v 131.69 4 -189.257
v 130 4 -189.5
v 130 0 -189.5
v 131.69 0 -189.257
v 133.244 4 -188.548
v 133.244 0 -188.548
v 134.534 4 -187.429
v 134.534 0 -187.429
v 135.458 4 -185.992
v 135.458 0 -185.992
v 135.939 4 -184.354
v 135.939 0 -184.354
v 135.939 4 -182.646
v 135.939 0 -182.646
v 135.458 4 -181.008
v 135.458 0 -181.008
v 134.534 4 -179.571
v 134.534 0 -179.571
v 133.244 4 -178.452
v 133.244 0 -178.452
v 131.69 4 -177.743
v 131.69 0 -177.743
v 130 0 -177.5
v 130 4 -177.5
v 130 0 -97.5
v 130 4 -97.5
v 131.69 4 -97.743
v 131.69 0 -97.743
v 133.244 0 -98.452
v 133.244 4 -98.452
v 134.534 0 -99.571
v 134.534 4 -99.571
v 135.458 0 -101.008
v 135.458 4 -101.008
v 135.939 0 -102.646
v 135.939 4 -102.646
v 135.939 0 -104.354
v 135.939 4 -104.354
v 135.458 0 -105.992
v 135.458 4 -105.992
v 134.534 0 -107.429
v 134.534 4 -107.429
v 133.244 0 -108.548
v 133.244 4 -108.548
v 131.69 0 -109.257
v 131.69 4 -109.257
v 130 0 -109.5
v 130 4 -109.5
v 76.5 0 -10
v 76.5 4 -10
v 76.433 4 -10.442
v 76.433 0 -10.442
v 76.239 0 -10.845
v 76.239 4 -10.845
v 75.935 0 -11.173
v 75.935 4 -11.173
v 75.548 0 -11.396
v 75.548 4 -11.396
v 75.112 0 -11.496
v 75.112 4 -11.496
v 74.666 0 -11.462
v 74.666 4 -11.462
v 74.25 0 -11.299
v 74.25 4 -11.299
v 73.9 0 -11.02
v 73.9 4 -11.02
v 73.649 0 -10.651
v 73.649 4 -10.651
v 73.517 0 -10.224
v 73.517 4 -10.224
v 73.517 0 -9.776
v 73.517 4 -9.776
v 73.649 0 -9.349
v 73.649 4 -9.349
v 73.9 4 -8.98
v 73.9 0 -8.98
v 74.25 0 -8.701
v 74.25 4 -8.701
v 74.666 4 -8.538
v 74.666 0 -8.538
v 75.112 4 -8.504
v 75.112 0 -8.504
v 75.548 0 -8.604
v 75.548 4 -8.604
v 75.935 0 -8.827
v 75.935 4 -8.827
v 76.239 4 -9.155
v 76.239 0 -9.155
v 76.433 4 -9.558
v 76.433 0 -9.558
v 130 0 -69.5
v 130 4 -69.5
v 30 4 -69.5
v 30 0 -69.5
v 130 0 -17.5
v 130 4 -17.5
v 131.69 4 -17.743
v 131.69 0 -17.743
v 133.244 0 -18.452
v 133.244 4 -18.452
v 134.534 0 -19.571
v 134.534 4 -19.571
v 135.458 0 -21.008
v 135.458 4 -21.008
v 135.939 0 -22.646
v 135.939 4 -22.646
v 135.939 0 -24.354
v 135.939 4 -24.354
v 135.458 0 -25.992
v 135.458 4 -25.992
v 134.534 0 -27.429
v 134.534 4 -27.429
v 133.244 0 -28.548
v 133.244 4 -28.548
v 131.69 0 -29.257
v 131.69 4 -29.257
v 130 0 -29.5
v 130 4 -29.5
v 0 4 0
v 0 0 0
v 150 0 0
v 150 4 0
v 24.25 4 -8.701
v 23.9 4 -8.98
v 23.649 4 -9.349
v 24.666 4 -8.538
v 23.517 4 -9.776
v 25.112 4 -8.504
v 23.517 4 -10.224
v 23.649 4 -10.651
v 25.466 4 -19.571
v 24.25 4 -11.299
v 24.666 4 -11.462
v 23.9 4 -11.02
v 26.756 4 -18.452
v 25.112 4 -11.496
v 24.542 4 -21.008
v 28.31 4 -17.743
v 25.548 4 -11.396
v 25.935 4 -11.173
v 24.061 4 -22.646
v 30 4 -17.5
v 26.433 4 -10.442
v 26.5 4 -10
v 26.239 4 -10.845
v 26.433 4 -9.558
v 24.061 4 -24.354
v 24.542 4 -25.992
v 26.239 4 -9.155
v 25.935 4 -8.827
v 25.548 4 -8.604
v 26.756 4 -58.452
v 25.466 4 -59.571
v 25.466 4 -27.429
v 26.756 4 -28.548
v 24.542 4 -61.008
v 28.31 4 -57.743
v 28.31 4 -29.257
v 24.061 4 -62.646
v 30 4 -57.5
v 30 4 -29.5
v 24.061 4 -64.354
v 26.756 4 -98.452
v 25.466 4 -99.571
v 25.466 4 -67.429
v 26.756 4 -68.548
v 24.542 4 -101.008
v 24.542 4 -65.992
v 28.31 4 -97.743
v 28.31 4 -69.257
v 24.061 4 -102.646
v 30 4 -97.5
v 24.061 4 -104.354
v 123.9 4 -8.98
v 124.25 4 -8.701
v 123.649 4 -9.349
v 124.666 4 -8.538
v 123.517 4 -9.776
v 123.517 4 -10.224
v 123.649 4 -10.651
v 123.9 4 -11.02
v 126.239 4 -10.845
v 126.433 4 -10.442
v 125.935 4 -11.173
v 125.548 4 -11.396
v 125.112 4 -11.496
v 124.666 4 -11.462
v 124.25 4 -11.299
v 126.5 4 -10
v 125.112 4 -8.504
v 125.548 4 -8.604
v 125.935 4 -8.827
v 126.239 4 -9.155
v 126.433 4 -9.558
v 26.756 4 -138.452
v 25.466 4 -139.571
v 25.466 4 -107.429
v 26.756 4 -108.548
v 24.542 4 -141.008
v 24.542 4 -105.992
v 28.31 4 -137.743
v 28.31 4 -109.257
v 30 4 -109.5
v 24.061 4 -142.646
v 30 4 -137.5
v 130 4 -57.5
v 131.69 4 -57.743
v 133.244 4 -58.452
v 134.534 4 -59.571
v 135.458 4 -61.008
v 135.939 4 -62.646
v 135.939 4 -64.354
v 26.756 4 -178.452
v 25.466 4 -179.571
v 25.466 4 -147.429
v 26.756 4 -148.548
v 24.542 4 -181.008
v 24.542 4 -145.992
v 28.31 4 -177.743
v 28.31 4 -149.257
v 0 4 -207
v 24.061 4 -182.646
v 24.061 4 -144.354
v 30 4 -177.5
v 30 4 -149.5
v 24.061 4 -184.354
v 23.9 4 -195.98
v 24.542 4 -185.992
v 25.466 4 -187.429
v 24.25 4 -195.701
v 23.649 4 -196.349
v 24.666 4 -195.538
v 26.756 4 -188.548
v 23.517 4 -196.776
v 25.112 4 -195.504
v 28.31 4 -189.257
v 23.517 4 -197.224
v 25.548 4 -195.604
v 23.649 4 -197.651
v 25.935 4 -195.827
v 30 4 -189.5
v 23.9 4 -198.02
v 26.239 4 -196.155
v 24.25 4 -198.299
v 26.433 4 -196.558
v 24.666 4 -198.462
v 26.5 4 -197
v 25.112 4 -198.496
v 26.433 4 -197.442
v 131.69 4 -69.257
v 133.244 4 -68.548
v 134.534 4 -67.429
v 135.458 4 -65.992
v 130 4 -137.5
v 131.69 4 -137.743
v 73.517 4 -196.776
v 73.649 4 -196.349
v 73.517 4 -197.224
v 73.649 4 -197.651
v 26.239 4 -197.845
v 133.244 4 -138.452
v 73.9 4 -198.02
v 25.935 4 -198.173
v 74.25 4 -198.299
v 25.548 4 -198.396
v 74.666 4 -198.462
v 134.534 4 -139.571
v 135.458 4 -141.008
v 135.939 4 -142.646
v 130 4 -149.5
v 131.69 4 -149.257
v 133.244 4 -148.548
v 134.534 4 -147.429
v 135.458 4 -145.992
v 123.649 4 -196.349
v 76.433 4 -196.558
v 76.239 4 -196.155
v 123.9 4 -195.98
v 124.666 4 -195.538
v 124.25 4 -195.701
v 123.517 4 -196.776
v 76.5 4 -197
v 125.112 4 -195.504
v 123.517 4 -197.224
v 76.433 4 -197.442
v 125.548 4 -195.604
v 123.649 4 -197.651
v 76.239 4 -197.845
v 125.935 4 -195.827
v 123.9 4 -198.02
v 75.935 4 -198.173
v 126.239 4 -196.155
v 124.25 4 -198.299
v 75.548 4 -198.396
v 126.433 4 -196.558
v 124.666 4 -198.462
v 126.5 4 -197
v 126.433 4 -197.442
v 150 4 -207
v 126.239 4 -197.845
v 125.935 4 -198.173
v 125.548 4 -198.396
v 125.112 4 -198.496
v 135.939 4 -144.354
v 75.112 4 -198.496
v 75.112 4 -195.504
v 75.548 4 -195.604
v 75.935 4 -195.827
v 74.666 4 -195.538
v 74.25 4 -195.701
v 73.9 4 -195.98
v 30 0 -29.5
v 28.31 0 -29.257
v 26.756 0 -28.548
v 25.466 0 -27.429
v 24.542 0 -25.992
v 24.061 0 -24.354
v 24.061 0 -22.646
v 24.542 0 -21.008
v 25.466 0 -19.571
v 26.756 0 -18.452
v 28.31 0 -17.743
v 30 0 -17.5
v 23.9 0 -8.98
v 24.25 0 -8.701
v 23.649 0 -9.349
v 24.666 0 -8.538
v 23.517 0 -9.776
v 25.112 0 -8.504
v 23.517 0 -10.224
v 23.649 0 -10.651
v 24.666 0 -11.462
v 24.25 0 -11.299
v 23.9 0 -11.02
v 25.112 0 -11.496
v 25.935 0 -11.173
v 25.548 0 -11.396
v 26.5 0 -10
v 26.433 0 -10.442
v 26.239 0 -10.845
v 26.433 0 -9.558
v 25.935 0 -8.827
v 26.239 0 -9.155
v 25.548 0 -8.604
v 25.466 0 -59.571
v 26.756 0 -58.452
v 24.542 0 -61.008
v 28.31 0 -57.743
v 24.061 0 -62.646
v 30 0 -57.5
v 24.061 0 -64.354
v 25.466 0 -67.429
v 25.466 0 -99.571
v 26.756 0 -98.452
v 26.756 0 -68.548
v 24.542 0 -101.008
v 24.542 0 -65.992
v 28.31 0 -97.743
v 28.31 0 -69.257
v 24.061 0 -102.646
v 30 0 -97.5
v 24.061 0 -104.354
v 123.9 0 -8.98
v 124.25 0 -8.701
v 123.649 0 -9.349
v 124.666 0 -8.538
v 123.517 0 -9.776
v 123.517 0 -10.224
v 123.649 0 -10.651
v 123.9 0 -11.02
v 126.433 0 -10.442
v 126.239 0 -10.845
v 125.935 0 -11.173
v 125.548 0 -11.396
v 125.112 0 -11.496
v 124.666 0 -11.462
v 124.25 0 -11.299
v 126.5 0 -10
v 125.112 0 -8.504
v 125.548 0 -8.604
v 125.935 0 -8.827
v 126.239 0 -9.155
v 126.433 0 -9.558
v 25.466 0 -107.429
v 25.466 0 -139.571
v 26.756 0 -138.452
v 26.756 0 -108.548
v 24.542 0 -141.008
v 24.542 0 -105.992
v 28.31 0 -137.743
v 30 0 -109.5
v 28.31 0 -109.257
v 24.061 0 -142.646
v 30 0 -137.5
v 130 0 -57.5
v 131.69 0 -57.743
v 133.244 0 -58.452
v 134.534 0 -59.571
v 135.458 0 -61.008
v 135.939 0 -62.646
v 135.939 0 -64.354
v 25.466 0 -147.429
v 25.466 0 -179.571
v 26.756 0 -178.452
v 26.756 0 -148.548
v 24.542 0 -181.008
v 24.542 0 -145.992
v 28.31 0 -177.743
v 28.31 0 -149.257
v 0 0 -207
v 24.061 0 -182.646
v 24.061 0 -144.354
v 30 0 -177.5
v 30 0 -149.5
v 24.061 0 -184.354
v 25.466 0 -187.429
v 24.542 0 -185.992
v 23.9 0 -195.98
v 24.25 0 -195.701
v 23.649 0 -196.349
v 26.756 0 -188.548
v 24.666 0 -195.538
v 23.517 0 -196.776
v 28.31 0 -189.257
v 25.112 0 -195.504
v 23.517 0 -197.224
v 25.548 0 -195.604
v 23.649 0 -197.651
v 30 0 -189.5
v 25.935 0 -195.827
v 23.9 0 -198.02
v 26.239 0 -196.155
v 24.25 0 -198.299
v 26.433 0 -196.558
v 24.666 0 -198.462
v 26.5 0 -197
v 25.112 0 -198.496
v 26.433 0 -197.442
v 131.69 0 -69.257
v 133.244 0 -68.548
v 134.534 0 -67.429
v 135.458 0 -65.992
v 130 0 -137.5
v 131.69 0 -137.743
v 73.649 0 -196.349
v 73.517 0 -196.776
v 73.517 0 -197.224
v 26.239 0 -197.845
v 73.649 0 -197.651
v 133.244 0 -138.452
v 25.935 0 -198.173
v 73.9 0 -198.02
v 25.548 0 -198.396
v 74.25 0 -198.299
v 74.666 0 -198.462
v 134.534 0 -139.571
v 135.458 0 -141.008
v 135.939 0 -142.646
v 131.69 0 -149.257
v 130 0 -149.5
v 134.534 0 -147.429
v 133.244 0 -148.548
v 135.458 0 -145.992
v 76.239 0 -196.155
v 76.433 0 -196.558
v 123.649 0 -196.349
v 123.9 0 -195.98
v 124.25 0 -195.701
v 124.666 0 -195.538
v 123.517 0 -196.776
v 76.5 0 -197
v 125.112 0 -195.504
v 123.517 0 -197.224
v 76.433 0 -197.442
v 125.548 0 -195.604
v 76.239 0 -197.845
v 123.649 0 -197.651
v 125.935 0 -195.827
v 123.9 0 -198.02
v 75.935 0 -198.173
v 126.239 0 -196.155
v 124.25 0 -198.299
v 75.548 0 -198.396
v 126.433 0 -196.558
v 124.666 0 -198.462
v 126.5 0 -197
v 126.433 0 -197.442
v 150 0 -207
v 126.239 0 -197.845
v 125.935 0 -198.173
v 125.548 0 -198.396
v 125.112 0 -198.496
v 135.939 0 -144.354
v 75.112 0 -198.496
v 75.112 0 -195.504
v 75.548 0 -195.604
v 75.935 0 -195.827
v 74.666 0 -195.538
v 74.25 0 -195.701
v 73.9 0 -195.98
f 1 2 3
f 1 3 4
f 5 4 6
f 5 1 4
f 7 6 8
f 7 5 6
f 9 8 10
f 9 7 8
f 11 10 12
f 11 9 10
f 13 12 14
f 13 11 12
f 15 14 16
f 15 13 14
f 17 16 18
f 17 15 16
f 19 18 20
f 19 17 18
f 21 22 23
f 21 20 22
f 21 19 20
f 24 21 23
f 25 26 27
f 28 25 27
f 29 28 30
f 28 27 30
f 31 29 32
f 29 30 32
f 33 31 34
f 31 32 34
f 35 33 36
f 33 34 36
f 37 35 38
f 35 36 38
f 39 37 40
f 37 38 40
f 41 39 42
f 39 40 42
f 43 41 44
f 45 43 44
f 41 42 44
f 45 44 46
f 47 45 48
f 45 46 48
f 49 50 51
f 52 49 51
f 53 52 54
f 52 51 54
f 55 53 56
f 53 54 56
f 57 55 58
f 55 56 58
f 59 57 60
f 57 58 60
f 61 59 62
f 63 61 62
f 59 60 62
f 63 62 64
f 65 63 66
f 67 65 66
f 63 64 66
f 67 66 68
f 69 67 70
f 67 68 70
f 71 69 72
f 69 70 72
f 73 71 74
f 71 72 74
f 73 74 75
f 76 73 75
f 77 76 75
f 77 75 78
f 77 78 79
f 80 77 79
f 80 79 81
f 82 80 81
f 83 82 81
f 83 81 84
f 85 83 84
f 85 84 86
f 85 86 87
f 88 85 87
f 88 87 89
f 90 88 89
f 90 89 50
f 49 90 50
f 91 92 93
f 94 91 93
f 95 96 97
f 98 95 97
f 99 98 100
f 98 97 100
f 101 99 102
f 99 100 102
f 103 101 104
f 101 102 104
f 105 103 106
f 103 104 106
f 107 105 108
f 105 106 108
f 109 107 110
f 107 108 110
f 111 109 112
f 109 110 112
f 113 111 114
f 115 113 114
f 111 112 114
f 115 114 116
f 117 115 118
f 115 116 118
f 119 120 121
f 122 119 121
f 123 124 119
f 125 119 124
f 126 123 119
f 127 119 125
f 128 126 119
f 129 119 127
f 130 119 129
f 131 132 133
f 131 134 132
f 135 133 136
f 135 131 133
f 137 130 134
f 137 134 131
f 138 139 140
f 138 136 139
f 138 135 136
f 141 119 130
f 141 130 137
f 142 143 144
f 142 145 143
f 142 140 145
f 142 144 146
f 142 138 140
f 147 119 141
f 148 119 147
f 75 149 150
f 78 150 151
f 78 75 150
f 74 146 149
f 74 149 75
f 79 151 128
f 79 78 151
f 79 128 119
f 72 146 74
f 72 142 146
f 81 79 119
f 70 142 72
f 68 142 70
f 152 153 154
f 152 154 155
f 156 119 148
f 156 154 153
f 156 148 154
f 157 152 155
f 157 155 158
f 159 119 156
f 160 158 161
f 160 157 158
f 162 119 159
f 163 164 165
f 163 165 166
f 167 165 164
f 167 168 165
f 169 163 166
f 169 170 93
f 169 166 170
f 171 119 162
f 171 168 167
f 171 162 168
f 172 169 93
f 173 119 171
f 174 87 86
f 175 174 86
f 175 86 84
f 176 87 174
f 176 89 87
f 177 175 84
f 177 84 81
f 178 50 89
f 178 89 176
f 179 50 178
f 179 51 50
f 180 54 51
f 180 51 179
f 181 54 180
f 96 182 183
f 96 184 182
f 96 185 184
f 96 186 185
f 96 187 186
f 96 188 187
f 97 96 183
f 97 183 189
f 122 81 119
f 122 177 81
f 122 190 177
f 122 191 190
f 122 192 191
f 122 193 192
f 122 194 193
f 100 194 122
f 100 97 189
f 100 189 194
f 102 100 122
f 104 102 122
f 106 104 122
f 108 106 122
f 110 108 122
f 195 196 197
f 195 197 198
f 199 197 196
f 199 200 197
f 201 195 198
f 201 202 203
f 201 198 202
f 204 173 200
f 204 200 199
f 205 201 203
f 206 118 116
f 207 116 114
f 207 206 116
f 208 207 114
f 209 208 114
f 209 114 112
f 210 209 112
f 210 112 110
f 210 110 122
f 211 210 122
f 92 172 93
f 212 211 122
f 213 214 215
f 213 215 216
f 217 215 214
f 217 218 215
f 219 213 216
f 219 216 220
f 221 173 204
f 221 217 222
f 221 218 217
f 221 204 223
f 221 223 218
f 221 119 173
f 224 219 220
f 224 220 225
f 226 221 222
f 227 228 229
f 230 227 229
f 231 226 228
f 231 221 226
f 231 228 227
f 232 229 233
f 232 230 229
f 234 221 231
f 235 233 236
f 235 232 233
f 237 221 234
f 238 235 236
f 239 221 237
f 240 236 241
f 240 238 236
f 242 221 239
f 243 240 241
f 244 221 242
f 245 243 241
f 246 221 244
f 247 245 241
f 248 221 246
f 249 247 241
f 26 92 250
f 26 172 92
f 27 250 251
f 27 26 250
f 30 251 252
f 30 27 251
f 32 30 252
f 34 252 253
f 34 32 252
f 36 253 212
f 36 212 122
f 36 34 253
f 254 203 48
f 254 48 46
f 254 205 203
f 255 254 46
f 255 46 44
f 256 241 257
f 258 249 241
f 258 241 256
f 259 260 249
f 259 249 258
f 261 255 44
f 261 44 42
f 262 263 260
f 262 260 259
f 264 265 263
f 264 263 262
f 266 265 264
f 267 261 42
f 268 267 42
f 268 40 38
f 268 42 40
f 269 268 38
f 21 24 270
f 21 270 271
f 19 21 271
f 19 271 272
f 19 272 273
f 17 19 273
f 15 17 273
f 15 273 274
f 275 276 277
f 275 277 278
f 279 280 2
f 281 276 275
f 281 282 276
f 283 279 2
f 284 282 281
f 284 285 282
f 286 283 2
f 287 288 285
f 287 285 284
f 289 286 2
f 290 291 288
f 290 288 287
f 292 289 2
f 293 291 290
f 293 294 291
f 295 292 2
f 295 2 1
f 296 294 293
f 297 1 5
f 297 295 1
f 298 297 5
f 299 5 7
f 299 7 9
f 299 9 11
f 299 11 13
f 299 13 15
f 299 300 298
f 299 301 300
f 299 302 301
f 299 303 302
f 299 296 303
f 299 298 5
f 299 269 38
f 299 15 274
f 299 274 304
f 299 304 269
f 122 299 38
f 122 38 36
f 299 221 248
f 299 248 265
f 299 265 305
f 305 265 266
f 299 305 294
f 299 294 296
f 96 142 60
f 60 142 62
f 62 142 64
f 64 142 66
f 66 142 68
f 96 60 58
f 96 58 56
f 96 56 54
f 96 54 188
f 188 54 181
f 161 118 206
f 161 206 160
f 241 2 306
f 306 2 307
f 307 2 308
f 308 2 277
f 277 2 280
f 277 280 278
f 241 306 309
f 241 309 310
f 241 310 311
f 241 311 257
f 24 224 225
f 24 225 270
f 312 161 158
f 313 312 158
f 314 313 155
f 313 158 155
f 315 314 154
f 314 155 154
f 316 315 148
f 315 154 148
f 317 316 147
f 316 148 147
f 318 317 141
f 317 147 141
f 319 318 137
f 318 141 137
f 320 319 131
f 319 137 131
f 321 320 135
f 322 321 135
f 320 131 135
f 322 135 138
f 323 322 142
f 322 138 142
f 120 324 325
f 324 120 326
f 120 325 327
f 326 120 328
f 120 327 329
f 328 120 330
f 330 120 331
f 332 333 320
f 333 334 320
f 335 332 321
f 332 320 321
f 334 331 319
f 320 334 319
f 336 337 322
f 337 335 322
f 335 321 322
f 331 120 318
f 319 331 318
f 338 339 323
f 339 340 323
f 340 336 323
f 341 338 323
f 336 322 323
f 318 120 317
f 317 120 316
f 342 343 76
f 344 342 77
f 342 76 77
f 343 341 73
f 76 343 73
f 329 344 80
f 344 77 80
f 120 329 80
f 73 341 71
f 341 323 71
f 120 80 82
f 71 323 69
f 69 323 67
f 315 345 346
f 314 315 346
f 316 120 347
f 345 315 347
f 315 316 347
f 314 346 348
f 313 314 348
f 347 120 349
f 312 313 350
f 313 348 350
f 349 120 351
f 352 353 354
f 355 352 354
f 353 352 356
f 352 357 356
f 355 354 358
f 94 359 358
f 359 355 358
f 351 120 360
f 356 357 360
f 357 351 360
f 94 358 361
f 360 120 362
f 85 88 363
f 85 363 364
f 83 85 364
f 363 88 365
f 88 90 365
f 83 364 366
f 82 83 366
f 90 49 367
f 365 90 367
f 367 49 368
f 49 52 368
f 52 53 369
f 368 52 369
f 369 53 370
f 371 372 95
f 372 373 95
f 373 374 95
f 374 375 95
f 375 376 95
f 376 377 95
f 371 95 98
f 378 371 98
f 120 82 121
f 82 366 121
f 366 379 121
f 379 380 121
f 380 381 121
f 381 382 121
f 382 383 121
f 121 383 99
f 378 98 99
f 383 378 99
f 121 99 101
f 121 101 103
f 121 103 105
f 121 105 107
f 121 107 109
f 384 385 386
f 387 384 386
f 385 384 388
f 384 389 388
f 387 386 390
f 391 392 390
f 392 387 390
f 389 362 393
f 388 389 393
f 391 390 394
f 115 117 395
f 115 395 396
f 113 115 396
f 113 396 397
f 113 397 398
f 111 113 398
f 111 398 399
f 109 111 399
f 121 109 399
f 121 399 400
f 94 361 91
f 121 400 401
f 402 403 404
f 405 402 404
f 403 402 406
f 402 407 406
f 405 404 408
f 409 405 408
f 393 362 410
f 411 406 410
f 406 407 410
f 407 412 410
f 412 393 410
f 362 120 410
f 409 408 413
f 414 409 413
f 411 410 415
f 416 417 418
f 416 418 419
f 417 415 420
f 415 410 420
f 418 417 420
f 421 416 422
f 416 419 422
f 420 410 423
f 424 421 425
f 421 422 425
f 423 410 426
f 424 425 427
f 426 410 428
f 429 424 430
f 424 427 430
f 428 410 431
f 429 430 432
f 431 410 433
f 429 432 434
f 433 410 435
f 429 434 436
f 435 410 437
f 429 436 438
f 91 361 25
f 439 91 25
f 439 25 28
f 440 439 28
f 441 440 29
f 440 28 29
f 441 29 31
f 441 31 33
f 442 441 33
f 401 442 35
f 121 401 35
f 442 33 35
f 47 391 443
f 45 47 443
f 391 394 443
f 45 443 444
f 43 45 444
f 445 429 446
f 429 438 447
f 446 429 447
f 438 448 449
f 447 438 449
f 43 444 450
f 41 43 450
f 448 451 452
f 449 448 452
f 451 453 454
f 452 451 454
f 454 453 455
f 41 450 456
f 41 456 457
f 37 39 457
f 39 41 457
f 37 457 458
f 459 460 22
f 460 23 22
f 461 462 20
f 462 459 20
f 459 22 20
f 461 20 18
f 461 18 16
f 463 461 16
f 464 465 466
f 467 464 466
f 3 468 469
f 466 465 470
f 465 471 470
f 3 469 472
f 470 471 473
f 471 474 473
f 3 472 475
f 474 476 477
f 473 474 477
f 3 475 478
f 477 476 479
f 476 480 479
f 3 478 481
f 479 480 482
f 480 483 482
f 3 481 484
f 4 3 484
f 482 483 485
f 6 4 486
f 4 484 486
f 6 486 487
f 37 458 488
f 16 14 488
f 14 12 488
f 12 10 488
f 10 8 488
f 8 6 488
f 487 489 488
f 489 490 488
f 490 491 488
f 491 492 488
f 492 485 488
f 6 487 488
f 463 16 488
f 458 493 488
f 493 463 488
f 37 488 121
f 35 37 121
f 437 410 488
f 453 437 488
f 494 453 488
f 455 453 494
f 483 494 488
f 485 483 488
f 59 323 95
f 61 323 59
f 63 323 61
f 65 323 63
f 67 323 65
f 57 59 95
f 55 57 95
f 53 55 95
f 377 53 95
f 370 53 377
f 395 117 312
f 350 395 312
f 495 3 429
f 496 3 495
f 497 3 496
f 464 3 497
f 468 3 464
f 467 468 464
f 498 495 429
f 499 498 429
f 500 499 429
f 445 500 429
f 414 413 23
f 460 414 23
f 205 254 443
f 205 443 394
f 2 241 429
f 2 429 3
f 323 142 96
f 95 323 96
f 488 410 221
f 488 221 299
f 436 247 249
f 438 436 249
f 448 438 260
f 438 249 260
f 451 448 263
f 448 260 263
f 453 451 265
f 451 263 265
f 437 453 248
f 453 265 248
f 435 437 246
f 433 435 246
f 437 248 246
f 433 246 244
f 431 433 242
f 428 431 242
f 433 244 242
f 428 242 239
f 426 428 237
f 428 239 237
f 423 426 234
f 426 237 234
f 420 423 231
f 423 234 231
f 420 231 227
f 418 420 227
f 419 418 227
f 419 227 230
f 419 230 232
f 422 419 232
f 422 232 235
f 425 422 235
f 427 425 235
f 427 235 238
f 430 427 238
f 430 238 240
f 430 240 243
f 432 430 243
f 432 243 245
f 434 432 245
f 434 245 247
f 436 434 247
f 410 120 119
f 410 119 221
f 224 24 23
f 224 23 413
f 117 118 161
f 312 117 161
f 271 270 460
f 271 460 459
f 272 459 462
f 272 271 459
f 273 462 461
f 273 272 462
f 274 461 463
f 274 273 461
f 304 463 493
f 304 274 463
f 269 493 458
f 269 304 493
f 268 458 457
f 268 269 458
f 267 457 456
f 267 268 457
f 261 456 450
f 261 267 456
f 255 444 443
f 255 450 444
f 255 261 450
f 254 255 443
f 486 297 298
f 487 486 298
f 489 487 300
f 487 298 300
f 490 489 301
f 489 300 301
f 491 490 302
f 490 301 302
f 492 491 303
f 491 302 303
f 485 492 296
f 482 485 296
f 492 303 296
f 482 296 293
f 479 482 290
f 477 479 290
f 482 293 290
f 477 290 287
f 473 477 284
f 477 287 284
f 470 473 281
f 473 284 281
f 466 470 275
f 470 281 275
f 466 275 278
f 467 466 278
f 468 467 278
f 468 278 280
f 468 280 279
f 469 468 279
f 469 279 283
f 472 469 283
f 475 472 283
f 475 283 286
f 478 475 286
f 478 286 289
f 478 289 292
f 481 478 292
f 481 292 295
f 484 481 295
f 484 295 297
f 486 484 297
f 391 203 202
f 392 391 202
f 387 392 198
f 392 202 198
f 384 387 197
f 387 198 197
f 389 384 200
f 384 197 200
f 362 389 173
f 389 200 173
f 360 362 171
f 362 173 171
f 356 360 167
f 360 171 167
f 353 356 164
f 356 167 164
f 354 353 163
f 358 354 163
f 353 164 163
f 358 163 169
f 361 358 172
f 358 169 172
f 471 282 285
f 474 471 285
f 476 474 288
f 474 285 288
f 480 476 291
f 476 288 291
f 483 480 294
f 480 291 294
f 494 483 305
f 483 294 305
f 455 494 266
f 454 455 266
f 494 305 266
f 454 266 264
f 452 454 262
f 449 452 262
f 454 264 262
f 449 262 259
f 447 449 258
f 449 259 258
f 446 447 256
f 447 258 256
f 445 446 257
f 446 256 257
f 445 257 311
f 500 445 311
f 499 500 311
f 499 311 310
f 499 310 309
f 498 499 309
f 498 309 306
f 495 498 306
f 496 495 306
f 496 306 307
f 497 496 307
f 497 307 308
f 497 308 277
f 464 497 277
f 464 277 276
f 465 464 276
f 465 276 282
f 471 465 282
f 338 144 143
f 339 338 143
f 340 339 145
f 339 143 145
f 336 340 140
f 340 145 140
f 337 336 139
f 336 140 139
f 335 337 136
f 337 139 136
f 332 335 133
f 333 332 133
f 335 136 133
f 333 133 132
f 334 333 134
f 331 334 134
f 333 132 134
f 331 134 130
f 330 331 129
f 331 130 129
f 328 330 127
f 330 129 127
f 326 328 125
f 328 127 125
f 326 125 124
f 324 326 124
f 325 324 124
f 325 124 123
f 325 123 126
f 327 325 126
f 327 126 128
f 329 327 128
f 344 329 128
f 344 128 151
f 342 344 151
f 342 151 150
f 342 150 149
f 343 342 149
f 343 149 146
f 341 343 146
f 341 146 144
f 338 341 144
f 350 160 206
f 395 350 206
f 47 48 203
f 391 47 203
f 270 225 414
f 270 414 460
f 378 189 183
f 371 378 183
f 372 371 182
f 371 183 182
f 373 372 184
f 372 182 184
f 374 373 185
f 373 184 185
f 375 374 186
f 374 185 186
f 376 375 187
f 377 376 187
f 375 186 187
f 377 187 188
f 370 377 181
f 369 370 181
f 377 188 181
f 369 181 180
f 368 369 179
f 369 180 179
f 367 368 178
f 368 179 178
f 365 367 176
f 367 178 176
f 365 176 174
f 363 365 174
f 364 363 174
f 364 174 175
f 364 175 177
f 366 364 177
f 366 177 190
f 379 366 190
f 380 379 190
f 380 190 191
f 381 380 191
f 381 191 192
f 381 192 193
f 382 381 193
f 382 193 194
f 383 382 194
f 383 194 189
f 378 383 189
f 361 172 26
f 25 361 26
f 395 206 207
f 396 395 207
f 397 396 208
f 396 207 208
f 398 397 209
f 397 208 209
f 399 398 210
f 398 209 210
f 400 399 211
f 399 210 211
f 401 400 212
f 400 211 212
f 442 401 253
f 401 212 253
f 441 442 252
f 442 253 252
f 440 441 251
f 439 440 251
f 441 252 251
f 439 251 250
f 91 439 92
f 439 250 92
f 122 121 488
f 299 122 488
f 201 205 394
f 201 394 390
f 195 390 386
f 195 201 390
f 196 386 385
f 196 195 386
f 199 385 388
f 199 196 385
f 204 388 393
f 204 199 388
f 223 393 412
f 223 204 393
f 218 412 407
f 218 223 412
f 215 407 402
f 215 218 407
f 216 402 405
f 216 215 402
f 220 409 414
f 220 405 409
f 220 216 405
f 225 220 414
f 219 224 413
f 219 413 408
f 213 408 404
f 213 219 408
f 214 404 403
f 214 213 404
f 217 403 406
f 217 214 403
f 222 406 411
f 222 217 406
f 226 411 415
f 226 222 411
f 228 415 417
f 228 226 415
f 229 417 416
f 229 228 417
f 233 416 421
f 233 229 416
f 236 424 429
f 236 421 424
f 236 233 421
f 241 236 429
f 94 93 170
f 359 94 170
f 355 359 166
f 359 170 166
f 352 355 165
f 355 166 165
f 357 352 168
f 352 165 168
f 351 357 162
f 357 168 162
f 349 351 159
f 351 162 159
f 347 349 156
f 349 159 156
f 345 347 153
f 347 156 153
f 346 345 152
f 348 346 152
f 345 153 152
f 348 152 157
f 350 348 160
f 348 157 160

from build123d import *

# Parameters (mm, degrees)
SKETCH_1_W          = 150
SKETCH_1_H          = 207
EXTRUDE_1_DEPTH     = 4
CUT_EXTRUDE_1_DEPTH = 5
SKETCH_3_R          = 1.5
CUT_EXTRUDE_2_DEPTH = 5


with BuildPart() as part:
    # 草图1 → 凸台-拉伸1 (new body)
    with BuildSketch(Plane(origin=(0, 0, 0), x_dir=(1, 0, 0), z_dir=(0, 1, 0))):
        with Locations((75, 103.5)):
            Rectangle(SKETCH_1_W, SKETCH_1_H)
    extrude(amount=EXTRUDE_1_DEPTH)

    # 草图2 → 切除-拉伸1 (cut, through all)
    with BuildSketch(Plane(origin=(0, 4, 0), x_dir=(1, 0, 0), z_dir=(0, 1, 0))):
        with BuildLine():
            Line((30, 189.5), (130, 189.5))
            ThreePointArc((130, 189.5), (136, 183.5), (130, 177.5))
            Line((130, 177.5), (30, 177.5))
            ThreePointArc((30, 177.5), (24, 183.5), (30, 189.5))
        make_face()
        with BuildLine():
            Line((30, 149.5), (130, 149.5))
            ThreePointArc((130, 149.5), (136, 143.5), (130, 137.5))
            Line((130, 137.5), (30, 137.5))
            ThreePointArc((30, 137.5), (24, 143.5), (30, 149.5))
        make_face()
        with BuildLine():
            Line((30, 97.5), (130, 97.5))
            ThreePointArc((130, 97.5), (136, 103.5), (130, 109.5))
            Line((130, 109.5), (30, 109.5))
            ThreePointArc((30, 109.5), (24, 103.5), (30, 97.5))
        make_face()
        with BuildLine():
            Line((30, 57.5), (130, 57.5))
            ThreePointArc((130, 57.5), (136, 63.5), (130, 69.5))
            Line((130, 69.5), (30, 69.5))
            ThreePointArc((30, 69.5), (24, 63.5), (30, 57.5))
        make_face()
        with BuildLine():
            Line((30, 17.5), (130, 17.5))
            ThreePointArc((130, 17.5), (136, 23.5), (130, 29.5))
            Line((130, 29.5), (30, 29.5))
            ThreePointArc((30, 29.5), (24, 23.5), (30, 17.5))
        make_face()
    extrude(amount=-CUT_EXTRUDE_1_DEPTH, mode=Mode.SUBTRACT)

    # 草图3 → 切除-拉伸2 (cut, through all)
    with BuildSketch(Plane(origin=(0, 4, 0), x_dir=(1, 0, 0), z_dir=(0, 1, 0))):
        with Locations((125, 197)):
            Circle(SKETCH_3_R)
        with Locations((75, 197)):
            Circle(SKETCH_3_R)
        with Locations((25, 197)):
            Circle(SKETCH_3_R)
        with Locations((25, 10)):
            Circle(SKETCH_3_R)
        with Locations((75, 10)):
            Circle(SKETCH_3_R)
        with Locations((125, 10)):
            Circle(SKETCH_3_R)
    extrude(amount=-CUT_EXTRUDE_2_DEPTH, mode=Mode.SUBTRACT)


solid = part.part
